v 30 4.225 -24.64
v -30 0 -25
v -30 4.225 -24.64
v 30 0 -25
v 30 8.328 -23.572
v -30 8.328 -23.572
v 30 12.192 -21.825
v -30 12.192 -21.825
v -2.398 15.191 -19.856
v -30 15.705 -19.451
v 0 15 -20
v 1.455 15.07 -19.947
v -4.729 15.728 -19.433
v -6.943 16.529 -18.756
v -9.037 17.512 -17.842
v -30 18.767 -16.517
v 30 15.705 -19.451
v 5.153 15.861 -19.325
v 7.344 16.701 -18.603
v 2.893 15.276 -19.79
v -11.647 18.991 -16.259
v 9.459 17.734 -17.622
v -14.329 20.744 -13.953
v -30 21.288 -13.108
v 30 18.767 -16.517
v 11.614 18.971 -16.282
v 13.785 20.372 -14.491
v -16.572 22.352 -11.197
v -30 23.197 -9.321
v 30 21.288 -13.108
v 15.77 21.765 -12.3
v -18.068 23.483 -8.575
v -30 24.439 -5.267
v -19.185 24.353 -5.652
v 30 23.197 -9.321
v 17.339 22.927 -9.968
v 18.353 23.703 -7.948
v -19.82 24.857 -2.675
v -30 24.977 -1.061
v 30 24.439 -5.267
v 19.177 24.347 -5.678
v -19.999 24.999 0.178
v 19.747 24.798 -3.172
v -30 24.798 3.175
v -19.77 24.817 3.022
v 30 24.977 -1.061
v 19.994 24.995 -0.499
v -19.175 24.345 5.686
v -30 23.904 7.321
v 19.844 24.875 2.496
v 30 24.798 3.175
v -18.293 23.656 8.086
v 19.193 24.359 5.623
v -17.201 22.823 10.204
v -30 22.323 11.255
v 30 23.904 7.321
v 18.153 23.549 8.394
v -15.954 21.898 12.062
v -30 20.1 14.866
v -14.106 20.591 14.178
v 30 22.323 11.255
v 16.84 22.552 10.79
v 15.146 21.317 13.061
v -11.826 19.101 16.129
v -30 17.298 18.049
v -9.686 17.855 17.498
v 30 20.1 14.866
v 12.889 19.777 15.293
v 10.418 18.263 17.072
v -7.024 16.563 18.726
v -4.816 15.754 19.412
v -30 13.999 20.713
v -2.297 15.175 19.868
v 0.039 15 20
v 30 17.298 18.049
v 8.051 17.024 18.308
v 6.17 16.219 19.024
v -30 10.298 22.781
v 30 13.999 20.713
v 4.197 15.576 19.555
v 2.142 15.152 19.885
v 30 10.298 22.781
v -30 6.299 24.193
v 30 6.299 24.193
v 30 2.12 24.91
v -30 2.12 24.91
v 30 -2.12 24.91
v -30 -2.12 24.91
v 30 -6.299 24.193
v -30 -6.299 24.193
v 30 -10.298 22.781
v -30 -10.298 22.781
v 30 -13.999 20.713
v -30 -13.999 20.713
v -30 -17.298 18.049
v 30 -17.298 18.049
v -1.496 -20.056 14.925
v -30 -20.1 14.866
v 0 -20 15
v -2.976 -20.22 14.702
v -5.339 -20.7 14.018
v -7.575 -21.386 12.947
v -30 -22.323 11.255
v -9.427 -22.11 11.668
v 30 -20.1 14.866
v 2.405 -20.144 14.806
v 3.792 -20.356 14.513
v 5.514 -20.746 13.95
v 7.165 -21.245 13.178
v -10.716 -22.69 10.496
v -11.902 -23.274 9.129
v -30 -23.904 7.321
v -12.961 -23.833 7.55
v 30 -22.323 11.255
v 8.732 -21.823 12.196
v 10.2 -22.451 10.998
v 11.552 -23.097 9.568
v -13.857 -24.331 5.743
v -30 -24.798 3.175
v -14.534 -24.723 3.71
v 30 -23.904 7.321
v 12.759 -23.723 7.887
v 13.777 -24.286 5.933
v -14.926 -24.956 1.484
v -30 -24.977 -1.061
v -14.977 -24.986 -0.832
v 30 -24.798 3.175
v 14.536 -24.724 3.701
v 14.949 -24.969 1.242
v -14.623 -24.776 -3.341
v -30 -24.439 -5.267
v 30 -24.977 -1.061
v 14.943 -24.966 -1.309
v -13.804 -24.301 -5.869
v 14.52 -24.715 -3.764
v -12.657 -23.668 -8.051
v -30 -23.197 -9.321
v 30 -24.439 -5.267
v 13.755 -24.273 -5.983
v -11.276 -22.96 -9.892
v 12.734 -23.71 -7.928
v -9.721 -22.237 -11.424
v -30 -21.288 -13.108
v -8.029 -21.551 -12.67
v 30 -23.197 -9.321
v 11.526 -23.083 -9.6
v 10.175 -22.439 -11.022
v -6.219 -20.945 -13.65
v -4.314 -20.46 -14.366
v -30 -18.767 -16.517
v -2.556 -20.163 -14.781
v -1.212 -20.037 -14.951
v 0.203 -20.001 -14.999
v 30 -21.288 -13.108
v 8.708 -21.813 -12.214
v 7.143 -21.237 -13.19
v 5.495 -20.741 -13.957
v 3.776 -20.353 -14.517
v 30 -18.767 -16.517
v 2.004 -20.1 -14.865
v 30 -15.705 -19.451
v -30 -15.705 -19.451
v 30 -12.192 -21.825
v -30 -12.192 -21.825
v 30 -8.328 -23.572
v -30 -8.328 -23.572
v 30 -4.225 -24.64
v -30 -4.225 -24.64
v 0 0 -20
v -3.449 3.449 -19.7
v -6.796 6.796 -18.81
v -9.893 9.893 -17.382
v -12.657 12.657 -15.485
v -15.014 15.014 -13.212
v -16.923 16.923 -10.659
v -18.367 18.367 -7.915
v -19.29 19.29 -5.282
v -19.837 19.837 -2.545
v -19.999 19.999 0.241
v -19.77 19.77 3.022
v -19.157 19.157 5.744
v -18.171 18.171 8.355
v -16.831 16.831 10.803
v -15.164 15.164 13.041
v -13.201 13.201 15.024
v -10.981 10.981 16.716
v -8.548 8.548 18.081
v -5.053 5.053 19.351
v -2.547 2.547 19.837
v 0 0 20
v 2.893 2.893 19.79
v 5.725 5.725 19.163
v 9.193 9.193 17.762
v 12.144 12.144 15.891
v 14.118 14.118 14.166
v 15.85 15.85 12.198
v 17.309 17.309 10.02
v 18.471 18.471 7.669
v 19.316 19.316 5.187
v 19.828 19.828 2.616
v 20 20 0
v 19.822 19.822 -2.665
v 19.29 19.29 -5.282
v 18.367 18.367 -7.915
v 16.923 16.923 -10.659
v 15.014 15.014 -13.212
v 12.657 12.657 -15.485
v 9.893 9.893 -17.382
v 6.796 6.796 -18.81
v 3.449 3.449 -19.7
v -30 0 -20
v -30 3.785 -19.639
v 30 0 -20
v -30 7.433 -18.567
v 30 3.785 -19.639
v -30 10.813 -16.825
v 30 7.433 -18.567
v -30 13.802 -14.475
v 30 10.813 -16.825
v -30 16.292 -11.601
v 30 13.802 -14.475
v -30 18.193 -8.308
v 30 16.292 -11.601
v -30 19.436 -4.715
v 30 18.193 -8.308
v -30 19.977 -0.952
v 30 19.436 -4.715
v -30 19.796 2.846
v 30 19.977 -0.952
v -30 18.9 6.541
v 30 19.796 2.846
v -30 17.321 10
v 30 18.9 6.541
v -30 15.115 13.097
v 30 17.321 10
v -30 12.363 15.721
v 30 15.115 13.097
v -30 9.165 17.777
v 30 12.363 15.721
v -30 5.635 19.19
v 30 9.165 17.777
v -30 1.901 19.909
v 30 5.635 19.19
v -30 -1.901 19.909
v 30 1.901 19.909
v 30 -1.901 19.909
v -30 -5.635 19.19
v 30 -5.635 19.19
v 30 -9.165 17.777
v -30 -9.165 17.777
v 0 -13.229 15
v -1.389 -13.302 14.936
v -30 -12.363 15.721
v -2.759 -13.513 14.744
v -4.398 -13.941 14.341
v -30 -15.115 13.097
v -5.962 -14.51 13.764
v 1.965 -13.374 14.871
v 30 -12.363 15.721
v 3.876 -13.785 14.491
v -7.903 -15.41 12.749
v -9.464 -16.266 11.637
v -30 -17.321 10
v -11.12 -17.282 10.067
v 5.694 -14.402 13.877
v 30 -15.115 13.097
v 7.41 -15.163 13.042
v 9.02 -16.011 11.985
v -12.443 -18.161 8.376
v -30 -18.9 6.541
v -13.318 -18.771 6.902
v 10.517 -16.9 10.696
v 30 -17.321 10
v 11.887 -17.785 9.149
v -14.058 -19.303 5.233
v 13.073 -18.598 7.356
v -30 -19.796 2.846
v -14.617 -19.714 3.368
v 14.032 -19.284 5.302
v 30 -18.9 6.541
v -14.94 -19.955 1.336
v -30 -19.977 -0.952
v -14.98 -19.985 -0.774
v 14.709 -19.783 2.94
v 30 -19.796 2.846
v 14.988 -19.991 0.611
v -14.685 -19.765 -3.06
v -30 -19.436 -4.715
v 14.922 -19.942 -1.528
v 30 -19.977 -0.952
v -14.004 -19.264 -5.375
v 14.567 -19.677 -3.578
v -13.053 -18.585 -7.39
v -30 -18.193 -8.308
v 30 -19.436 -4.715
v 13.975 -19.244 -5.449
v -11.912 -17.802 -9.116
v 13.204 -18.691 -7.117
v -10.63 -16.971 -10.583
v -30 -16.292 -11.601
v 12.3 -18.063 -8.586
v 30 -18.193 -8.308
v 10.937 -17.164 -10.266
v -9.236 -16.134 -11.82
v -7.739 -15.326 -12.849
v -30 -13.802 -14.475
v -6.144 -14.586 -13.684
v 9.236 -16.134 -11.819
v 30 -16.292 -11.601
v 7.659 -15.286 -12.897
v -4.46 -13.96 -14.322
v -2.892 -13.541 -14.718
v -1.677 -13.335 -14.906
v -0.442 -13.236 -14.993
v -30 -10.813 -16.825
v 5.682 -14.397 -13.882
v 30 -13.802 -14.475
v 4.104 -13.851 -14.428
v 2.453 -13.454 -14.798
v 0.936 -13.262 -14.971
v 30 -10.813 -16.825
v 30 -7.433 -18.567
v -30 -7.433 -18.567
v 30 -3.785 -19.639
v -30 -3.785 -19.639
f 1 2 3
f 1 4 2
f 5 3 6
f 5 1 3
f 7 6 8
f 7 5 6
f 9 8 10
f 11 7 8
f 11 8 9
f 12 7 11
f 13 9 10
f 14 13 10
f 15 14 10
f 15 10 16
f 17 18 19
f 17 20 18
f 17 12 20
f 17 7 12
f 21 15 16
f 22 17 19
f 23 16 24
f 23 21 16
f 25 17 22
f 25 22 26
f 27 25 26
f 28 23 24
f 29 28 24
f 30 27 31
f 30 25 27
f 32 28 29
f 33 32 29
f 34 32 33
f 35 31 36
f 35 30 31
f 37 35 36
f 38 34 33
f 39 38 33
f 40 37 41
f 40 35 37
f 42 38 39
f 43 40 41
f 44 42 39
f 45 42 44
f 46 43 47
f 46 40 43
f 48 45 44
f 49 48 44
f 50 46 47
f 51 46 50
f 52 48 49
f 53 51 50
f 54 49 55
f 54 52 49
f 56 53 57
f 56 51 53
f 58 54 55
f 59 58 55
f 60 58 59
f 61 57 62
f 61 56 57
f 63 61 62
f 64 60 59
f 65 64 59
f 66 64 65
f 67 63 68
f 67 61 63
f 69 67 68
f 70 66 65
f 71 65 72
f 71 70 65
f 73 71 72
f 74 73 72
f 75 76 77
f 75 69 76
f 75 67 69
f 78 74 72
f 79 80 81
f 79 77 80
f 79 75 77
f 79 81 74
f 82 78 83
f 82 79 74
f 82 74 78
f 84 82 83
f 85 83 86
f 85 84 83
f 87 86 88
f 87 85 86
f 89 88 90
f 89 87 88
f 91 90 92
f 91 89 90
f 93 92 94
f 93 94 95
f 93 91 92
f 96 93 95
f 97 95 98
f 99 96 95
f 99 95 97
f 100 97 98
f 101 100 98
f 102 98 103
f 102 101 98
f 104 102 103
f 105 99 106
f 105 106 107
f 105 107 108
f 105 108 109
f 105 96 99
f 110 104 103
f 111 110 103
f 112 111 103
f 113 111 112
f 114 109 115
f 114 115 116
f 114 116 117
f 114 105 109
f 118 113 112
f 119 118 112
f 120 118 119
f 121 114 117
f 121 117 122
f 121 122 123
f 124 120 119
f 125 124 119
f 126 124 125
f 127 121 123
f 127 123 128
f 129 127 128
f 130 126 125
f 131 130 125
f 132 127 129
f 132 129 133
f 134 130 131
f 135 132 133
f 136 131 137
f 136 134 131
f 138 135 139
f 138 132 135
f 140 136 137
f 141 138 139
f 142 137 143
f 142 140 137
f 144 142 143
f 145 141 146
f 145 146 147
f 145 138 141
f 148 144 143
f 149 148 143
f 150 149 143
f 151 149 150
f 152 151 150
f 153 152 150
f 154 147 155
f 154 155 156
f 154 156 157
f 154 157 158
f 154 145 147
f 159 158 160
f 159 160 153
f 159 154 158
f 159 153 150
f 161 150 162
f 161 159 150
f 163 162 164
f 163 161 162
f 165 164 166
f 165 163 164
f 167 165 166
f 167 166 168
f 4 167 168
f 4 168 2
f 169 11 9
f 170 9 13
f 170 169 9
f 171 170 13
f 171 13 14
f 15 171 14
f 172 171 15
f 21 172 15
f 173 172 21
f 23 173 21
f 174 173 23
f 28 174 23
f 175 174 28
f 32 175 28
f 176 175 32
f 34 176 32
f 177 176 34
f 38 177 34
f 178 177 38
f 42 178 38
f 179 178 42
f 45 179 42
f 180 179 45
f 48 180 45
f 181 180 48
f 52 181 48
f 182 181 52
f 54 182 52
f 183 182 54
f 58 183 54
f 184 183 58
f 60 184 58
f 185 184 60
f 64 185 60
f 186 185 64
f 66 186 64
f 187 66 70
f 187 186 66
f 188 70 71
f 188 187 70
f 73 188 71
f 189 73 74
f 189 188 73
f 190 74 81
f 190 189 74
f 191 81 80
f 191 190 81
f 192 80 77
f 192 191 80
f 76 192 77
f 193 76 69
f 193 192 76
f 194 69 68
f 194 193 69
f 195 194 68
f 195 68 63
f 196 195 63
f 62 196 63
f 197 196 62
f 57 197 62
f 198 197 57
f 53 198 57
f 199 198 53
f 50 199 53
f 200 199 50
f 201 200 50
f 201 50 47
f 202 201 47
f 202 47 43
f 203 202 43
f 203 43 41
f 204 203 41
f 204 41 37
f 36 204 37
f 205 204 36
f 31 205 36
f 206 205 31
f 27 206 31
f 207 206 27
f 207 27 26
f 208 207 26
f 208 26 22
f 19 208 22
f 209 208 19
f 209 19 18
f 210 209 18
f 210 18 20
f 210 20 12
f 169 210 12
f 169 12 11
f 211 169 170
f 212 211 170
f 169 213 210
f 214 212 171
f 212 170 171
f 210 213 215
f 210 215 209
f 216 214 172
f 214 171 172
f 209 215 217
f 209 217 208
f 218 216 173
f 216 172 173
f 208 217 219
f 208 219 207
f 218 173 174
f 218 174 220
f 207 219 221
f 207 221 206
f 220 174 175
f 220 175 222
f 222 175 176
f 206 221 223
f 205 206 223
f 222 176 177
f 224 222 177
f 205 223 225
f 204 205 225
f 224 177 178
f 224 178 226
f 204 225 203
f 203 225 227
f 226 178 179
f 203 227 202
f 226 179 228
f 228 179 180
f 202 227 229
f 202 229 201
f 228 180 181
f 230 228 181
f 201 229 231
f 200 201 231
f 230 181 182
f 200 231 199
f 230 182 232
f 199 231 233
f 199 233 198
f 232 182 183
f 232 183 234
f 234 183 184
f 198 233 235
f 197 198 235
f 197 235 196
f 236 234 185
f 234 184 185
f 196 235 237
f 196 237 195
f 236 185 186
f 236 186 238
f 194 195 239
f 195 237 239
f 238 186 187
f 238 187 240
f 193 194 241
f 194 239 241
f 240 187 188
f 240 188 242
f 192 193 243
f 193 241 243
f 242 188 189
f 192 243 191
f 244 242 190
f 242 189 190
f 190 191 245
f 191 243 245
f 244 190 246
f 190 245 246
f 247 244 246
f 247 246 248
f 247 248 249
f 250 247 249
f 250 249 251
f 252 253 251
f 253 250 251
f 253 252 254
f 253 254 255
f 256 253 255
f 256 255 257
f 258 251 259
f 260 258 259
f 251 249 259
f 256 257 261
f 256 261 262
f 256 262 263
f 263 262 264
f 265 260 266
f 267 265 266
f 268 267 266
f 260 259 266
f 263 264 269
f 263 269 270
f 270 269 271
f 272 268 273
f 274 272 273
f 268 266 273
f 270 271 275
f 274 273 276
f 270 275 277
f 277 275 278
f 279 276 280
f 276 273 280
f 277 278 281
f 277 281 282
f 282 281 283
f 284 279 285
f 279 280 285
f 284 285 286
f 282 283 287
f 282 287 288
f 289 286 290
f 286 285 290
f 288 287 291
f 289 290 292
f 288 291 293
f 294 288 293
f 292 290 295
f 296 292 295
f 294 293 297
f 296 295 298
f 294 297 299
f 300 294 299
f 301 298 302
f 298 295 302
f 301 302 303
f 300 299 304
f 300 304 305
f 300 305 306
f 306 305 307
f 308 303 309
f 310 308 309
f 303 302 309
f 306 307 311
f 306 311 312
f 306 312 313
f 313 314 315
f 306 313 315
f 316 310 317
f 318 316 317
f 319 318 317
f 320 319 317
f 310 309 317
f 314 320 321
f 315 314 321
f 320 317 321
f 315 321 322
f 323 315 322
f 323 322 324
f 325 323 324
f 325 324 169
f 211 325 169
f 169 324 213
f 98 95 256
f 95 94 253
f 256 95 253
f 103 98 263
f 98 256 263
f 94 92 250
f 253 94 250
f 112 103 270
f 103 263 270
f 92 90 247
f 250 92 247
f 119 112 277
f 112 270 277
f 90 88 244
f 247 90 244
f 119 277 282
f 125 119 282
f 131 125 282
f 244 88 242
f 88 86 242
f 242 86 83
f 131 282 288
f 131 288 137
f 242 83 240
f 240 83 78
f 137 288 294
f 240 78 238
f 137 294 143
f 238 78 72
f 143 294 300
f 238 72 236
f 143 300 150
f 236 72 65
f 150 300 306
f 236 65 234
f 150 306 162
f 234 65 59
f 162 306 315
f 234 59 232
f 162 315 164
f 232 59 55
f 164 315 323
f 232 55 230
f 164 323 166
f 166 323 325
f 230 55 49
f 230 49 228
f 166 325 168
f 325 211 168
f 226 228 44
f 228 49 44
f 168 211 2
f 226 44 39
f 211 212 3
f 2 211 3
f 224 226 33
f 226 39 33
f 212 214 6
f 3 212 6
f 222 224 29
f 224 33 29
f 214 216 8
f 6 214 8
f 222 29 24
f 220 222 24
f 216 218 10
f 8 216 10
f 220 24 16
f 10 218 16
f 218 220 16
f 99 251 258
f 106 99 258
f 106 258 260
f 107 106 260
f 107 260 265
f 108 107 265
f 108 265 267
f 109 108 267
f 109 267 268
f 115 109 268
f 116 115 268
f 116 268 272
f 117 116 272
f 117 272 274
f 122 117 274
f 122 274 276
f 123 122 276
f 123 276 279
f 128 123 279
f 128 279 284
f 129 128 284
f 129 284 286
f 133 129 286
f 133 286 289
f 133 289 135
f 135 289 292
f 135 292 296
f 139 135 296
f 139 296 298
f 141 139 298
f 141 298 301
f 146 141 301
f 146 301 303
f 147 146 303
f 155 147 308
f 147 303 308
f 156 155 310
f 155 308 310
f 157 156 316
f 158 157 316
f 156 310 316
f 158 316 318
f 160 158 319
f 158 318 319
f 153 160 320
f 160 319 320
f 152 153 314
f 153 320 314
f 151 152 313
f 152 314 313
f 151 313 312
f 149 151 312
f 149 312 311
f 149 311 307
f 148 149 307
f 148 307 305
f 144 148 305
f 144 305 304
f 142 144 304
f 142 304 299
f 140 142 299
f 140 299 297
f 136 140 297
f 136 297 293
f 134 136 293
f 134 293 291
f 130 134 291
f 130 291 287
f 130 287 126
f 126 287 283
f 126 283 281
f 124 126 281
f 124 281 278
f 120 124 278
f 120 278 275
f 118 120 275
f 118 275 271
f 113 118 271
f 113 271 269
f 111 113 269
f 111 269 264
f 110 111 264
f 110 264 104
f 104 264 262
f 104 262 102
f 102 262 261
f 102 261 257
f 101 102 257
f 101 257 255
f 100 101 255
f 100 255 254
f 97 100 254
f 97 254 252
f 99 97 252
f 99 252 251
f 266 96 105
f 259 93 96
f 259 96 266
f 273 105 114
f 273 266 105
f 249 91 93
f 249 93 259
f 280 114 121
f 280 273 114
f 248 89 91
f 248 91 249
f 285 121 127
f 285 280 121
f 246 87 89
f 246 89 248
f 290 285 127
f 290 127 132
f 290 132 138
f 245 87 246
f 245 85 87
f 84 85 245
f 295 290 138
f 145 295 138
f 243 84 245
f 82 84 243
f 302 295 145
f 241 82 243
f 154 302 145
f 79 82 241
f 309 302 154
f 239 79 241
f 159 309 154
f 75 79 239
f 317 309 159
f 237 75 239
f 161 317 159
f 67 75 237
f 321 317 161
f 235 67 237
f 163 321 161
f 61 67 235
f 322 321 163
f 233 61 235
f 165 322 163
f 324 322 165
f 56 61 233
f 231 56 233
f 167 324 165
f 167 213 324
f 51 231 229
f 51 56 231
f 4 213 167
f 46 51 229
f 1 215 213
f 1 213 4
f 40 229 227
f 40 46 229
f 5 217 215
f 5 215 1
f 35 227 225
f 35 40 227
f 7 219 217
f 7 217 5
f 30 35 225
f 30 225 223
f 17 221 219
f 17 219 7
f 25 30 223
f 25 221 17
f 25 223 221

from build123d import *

# Parameters (mm, degrees)
SKETCH_1_R          = 25
EXTRUDE_1_DEPTH     = 30
SKETCH_2_R          = 20
CUT_EXTRUDE_1_DEPTH = 30
SKETCH_3_R          = 20
CUT_EXTRUDE_2_DEPTH = 40
SKETCH_4_R          = 15
CUT_EXTRUDE_4_DEPTH = 200


with BuildPart() as part:
    # 草图1 → 凸台-拉伸1 (new, symmetric)
    with BuildSketch(Plane(origin=(0, 0, 0), x_dir=(0, 0, -1), z_dir=(1, 0, 0))):
        Circle(SKETCH_1_R)
    extrude(amount=EXTRUDE_1_DEPTH, both=True)

    # 草图2 → 切除-拉伸1 (cut, symmetric)
    with BuildSketch(Plane(origin=(0, 0, 0), x_dir=(0, 0, -1), z_dir=(1, 0, 0))):
        Circle(SKETCH_2_R)
    extrude(amount=CUT_EXTRUDE_1_DEPTH, both=True, mode=Mode.SUBTRACT)

    # 草图3 → 切除-拉伸2 (cut)
    with BuildSketch(Plane(origin=(0, 0, 0), x_dir=(1, 0, 0), z_dir=(0, 1, 0))):
        with Locations(Location((0, 0, 0), (0, 0, 90))):
            Circle(SKETCH_3_R)
    extrude(amount=CUT_EXTRUDE_2_DEPTH, mode=Mode.SUBTRACT)

    # 草图4 → 切除-拉伸4 (cut)
    with BuildSketch(Plane(origin=(0, 0, 0), x_dir=(1, 0, 0), z_dir=(0, 1, 0))):
        with Locations(Location((0, 0, 0), (0, 0, 270))):
            Circle(SKETCH_4_R)
    extrude(amount=-CUT_EXTRUDE_4_DEPTH, mode=Mode.SUBTRACT)


solid = part.part
